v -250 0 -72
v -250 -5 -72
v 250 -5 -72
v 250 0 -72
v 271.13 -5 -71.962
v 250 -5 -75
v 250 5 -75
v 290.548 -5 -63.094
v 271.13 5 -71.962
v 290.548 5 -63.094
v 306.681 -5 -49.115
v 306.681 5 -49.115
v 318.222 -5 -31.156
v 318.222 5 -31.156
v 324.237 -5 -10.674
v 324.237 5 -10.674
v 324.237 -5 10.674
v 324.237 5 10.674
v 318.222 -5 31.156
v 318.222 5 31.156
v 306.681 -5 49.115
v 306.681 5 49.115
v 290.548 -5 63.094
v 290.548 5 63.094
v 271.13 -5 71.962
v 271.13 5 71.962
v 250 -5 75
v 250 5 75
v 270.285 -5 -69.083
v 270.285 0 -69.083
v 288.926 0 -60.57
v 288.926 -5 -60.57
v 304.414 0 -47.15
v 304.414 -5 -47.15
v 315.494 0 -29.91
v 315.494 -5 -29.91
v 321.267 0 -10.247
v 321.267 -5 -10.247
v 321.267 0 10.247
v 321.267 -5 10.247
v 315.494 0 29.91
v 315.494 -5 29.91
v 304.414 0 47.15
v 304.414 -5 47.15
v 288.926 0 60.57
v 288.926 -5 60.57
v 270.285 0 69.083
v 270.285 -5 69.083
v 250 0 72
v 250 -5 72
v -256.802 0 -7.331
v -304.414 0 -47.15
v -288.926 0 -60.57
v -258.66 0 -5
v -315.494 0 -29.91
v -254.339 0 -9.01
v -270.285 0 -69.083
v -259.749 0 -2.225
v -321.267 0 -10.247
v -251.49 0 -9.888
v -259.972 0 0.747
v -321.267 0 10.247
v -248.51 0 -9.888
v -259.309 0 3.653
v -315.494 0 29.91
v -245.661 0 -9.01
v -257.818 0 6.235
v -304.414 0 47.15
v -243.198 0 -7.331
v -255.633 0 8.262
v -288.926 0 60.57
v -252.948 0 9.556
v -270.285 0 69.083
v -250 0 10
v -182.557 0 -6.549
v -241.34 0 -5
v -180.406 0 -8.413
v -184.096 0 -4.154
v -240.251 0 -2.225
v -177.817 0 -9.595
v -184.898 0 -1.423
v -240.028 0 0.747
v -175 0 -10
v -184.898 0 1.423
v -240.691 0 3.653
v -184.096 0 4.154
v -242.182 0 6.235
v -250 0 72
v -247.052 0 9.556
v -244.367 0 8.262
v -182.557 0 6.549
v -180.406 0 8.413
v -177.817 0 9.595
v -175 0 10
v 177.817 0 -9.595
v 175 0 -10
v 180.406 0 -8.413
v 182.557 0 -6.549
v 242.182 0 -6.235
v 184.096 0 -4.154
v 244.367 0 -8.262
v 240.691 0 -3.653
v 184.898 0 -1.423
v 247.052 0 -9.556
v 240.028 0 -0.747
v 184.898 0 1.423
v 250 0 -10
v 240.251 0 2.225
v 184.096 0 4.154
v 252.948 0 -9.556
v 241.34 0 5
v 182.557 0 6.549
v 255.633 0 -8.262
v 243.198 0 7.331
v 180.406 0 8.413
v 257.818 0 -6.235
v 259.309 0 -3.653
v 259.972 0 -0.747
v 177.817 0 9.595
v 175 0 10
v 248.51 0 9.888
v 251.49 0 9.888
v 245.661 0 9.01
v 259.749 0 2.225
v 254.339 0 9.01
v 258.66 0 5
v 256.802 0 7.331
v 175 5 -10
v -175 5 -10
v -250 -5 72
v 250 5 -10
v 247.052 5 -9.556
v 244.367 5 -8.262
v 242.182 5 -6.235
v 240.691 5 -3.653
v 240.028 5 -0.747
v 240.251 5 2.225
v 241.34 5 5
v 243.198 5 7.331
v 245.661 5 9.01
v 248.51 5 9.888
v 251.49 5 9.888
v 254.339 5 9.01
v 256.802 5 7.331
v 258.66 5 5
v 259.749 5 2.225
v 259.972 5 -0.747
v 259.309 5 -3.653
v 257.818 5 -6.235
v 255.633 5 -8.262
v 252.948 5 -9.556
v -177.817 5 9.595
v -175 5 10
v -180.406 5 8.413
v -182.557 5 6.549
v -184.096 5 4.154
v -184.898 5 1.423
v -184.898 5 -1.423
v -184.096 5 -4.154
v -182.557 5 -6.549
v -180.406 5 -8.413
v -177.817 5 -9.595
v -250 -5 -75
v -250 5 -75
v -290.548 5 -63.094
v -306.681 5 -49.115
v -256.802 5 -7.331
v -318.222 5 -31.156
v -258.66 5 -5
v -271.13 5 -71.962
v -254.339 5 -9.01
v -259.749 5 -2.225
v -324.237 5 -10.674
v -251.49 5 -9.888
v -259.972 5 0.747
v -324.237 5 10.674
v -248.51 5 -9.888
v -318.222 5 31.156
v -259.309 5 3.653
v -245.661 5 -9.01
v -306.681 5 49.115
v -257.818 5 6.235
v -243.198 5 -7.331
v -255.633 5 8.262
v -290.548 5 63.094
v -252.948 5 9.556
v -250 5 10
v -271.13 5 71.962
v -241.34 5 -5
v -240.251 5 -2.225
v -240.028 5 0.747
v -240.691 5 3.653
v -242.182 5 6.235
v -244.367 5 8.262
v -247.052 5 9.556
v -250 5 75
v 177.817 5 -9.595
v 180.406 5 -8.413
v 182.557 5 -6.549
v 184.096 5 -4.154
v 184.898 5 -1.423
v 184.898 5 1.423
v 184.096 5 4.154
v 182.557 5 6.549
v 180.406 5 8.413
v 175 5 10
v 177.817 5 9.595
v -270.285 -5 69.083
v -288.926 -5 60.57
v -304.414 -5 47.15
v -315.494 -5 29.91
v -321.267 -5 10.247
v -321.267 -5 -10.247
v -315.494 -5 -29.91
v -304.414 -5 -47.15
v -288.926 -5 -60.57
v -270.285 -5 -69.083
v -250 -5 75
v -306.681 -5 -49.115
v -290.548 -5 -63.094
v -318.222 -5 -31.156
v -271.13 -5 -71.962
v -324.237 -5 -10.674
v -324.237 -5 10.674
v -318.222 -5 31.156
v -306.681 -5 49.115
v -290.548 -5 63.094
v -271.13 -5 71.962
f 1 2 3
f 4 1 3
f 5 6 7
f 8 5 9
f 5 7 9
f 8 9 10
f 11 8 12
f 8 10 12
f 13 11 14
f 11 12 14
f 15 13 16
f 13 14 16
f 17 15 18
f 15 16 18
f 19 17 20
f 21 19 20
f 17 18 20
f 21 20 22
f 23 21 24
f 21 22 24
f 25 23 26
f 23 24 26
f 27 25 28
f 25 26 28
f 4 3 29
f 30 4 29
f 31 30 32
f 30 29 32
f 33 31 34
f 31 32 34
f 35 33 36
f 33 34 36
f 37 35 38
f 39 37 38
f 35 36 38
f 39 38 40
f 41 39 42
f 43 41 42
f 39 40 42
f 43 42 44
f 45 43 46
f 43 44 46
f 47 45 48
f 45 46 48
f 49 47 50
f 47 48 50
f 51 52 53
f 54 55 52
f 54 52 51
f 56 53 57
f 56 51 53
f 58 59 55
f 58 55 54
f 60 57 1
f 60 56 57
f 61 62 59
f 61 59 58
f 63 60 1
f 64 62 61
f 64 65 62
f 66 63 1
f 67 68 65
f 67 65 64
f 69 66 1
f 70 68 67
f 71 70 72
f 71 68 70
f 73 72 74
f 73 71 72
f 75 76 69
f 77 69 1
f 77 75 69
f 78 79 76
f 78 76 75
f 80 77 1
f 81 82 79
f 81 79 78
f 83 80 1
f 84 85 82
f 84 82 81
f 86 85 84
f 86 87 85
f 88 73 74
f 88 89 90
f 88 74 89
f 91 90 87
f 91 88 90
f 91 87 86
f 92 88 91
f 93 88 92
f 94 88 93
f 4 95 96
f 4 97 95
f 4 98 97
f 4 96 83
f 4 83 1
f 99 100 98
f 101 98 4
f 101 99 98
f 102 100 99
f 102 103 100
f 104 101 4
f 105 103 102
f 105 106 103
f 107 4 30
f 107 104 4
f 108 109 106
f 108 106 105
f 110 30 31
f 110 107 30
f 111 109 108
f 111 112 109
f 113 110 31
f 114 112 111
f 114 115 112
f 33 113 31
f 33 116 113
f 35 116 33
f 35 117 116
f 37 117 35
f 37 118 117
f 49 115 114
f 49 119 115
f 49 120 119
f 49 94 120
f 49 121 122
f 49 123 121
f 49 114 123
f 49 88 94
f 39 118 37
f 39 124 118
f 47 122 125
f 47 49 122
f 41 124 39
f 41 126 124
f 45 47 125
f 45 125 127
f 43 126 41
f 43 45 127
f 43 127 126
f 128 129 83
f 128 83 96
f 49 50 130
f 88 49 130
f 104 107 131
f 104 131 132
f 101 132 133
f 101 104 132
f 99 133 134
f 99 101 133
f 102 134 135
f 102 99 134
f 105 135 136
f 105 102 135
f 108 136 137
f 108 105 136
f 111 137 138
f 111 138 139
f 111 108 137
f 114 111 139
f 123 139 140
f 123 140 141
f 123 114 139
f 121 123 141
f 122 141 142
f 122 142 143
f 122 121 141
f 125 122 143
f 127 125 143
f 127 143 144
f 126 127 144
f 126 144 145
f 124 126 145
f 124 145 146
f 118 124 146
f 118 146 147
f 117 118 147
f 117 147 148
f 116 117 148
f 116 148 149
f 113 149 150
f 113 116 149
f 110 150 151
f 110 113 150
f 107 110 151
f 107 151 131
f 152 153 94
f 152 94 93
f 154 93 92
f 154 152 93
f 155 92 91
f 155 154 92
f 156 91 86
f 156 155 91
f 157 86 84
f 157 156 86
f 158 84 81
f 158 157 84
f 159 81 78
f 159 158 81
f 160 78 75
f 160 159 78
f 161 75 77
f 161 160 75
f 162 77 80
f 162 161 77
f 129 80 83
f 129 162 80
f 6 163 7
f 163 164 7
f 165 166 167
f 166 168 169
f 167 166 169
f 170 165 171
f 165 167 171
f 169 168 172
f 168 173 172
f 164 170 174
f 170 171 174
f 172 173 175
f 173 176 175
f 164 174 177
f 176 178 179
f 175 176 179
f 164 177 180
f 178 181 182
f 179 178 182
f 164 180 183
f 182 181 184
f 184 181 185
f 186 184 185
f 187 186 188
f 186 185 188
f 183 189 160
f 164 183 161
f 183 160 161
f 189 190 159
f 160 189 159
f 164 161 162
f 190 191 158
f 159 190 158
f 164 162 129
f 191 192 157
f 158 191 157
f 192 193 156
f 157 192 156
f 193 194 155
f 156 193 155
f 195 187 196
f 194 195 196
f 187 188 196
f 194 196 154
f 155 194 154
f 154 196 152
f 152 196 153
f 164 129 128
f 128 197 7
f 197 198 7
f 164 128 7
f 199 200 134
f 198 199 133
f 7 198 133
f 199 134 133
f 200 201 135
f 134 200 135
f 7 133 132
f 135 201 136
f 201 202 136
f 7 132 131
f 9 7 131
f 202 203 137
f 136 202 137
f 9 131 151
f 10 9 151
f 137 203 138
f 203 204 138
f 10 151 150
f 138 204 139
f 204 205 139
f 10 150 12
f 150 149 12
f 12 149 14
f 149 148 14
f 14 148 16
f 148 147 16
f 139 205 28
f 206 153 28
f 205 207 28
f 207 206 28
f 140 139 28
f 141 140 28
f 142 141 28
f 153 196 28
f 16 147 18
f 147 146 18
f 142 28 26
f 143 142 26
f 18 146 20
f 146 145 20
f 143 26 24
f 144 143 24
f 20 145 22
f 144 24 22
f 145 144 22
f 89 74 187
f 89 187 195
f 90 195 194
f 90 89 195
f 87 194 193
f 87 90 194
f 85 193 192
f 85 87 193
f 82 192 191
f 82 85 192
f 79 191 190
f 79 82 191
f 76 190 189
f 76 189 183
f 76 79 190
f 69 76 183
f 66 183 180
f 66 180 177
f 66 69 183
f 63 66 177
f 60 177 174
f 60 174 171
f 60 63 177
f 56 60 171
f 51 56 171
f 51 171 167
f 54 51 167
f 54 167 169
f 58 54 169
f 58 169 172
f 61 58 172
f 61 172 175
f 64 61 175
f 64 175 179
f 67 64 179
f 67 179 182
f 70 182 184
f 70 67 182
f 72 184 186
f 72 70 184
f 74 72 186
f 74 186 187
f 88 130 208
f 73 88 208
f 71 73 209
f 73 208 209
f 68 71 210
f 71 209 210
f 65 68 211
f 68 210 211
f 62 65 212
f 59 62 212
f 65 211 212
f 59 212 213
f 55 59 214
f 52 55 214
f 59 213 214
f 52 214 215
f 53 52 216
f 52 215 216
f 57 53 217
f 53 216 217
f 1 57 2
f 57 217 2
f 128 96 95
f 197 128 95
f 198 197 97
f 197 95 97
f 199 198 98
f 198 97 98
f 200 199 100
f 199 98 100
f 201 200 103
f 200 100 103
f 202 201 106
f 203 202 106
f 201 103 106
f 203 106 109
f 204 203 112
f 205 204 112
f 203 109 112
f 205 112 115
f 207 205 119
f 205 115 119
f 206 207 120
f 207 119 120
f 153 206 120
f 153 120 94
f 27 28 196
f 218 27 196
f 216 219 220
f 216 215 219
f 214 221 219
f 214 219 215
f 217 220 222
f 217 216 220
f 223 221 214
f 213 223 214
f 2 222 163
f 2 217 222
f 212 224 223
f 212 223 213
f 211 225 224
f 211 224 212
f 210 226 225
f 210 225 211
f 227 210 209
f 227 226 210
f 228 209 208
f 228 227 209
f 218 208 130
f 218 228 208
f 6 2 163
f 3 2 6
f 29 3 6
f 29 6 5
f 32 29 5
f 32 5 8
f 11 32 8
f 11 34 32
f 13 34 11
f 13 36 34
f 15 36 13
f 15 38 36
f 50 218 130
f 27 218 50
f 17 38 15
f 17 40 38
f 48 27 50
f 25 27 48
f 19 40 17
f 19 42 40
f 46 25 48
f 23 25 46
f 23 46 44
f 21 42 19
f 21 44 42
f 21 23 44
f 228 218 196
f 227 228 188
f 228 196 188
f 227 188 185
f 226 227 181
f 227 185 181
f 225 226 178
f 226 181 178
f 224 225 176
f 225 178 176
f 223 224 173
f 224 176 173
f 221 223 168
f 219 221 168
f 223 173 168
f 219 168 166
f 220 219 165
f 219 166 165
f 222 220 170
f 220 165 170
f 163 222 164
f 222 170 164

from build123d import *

# Parameters (mm, degrees)
SKETCH1_R           = 10
BOSS_EXTRUDE1_DEPTH = 5
CUT_EXTRUDE1_DEPTH  = 5


with BuildPart() as part:
    # Sketch1 → Boss-Extrude1 (new, symmetric)
    with BuildSketch(Plane(origin=(0, 0, 0), x_dir=(-1, 0, 0), z_dir=(0, 1, 0))):
        with BuildLine():
            Line((-250, 75), (250, 75))
            ThreePointArc((250, 75), (325, 0), (250, -75))
            Line((250, -75), (-250, -75))
            ThreePointArc((-250, -75), (-325, 0), (-250, 75))
        make_face()
        with Locations(Location((250, 0, 0), (0, 0, 90))):
            Circle(SKETCH1_R, mode=Mode.SUBTRACT)
        with Locations(Location((-250, 0, 0), (0, 0, 270))):
            Circle(SKETCH1_R, mode=Mode.SUBTRACT)
        with BuildLine():
            Line((-175, 10), (175, 10))
            ThreePointArc((175, 10), (185, 0), (175, -10))
            Line((175, -10), (-175, -10))
            ThreePointArc((-175, -10), (-185, 0), (-175, 10))
        make_face(mode=Mode.SUBTRACT)
    extrude(amount=BOSS_EXTRUDE1_DEPTH, both=True)

    # Sketch4 → Cut-Extrude1 (cut)
    with BuildSketch(Plane.XZ.offset(5)):
        with BuildLine():
            Line((250, 72), (-250, 72))
            ThreePointArc((-250, 72), (-322, 0), (-250, -72))
            Line((-250, -72), (250, -72))
            ThreePointArc((250, -72), (322, 0), (250, 72))
        make_face()
    extrude(amount=-CUT_EXTRUDE1_DEPTH, mode=Mode.SUBTRACT)


solid = part.part
